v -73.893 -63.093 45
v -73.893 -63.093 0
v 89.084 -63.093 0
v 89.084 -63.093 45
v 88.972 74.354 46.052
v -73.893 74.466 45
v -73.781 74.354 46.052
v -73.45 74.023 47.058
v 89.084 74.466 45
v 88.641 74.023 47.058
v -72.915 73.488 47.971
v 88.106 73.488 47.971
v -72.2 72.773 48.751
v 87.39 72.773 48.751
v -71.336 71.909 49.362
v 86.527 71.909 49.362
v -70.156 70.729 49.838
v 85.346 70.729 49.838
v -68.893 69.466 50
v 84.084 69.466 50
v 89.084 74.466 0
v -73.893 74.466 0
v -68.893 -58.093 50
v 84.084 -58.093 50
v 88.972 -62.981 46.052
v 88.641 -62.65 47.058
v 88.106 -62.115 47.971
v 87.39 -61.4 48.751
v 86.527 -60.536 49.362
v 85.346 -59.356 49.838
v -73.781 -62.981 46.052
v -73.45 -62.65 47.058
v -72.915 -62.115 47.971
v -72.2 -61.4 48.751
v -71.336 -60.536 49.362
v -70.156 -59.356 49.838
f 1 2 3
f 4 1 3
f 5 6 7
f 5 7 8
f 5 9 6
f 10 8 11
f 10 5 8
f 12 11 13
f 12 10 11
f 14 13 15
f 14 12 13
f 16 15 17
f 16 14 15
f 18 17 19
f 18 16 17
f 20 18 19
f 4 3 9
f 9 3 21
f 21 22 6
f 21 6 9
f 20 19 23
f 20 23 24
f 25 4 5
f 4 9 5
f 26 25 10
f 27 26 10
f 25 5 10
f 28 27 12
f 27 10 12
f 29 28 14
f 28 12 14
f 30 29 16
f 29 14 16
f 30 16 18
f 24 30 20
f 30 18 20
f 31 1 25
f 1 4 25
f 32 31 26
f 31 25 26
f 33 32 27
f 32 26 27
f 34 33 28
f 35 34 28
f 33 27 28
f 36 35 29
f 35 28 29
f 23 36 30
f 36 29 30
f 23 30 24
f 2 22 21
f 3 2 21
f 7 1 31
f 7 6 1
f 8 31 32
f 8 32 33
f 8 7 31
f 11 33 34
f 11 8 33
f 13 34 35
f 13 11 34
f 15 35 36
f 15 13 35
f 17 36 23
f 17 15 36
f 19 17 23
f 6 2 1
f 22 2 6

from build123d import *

# Parameters (mm, degrees)
F0_W     = 162.9769206047
F0_H     = 137.5593692064
F1_DEPTH = 50
F3_R     = 5


# Not quite as in the source:
# - a feature of the source that left no trace in its solid (it failed there, or was rolled back) is left out


with BuildPart() as f1:
    # F0 (on Top) → F1 (new body)
    with BuildSketch(Plane.XY):
        with Locations((7.5951814651, 5.6864470243)):
            Rectangle(F0_W, F0_H)
    extrude(amount=F1_DEPTH)

    # F3
    f3_edges = [f1.edges().sort_by_distance(p)[0] for p in [
        (89.083642, 5.686447, 50),
        (7.595181, -63.093238, 50),
        (-73.893279, 5.686447, 50),
        (7.595181, 74.466132, 50),
    ]]
    fillet(f3_edges, radius=F3_R)


solid = f1.part
